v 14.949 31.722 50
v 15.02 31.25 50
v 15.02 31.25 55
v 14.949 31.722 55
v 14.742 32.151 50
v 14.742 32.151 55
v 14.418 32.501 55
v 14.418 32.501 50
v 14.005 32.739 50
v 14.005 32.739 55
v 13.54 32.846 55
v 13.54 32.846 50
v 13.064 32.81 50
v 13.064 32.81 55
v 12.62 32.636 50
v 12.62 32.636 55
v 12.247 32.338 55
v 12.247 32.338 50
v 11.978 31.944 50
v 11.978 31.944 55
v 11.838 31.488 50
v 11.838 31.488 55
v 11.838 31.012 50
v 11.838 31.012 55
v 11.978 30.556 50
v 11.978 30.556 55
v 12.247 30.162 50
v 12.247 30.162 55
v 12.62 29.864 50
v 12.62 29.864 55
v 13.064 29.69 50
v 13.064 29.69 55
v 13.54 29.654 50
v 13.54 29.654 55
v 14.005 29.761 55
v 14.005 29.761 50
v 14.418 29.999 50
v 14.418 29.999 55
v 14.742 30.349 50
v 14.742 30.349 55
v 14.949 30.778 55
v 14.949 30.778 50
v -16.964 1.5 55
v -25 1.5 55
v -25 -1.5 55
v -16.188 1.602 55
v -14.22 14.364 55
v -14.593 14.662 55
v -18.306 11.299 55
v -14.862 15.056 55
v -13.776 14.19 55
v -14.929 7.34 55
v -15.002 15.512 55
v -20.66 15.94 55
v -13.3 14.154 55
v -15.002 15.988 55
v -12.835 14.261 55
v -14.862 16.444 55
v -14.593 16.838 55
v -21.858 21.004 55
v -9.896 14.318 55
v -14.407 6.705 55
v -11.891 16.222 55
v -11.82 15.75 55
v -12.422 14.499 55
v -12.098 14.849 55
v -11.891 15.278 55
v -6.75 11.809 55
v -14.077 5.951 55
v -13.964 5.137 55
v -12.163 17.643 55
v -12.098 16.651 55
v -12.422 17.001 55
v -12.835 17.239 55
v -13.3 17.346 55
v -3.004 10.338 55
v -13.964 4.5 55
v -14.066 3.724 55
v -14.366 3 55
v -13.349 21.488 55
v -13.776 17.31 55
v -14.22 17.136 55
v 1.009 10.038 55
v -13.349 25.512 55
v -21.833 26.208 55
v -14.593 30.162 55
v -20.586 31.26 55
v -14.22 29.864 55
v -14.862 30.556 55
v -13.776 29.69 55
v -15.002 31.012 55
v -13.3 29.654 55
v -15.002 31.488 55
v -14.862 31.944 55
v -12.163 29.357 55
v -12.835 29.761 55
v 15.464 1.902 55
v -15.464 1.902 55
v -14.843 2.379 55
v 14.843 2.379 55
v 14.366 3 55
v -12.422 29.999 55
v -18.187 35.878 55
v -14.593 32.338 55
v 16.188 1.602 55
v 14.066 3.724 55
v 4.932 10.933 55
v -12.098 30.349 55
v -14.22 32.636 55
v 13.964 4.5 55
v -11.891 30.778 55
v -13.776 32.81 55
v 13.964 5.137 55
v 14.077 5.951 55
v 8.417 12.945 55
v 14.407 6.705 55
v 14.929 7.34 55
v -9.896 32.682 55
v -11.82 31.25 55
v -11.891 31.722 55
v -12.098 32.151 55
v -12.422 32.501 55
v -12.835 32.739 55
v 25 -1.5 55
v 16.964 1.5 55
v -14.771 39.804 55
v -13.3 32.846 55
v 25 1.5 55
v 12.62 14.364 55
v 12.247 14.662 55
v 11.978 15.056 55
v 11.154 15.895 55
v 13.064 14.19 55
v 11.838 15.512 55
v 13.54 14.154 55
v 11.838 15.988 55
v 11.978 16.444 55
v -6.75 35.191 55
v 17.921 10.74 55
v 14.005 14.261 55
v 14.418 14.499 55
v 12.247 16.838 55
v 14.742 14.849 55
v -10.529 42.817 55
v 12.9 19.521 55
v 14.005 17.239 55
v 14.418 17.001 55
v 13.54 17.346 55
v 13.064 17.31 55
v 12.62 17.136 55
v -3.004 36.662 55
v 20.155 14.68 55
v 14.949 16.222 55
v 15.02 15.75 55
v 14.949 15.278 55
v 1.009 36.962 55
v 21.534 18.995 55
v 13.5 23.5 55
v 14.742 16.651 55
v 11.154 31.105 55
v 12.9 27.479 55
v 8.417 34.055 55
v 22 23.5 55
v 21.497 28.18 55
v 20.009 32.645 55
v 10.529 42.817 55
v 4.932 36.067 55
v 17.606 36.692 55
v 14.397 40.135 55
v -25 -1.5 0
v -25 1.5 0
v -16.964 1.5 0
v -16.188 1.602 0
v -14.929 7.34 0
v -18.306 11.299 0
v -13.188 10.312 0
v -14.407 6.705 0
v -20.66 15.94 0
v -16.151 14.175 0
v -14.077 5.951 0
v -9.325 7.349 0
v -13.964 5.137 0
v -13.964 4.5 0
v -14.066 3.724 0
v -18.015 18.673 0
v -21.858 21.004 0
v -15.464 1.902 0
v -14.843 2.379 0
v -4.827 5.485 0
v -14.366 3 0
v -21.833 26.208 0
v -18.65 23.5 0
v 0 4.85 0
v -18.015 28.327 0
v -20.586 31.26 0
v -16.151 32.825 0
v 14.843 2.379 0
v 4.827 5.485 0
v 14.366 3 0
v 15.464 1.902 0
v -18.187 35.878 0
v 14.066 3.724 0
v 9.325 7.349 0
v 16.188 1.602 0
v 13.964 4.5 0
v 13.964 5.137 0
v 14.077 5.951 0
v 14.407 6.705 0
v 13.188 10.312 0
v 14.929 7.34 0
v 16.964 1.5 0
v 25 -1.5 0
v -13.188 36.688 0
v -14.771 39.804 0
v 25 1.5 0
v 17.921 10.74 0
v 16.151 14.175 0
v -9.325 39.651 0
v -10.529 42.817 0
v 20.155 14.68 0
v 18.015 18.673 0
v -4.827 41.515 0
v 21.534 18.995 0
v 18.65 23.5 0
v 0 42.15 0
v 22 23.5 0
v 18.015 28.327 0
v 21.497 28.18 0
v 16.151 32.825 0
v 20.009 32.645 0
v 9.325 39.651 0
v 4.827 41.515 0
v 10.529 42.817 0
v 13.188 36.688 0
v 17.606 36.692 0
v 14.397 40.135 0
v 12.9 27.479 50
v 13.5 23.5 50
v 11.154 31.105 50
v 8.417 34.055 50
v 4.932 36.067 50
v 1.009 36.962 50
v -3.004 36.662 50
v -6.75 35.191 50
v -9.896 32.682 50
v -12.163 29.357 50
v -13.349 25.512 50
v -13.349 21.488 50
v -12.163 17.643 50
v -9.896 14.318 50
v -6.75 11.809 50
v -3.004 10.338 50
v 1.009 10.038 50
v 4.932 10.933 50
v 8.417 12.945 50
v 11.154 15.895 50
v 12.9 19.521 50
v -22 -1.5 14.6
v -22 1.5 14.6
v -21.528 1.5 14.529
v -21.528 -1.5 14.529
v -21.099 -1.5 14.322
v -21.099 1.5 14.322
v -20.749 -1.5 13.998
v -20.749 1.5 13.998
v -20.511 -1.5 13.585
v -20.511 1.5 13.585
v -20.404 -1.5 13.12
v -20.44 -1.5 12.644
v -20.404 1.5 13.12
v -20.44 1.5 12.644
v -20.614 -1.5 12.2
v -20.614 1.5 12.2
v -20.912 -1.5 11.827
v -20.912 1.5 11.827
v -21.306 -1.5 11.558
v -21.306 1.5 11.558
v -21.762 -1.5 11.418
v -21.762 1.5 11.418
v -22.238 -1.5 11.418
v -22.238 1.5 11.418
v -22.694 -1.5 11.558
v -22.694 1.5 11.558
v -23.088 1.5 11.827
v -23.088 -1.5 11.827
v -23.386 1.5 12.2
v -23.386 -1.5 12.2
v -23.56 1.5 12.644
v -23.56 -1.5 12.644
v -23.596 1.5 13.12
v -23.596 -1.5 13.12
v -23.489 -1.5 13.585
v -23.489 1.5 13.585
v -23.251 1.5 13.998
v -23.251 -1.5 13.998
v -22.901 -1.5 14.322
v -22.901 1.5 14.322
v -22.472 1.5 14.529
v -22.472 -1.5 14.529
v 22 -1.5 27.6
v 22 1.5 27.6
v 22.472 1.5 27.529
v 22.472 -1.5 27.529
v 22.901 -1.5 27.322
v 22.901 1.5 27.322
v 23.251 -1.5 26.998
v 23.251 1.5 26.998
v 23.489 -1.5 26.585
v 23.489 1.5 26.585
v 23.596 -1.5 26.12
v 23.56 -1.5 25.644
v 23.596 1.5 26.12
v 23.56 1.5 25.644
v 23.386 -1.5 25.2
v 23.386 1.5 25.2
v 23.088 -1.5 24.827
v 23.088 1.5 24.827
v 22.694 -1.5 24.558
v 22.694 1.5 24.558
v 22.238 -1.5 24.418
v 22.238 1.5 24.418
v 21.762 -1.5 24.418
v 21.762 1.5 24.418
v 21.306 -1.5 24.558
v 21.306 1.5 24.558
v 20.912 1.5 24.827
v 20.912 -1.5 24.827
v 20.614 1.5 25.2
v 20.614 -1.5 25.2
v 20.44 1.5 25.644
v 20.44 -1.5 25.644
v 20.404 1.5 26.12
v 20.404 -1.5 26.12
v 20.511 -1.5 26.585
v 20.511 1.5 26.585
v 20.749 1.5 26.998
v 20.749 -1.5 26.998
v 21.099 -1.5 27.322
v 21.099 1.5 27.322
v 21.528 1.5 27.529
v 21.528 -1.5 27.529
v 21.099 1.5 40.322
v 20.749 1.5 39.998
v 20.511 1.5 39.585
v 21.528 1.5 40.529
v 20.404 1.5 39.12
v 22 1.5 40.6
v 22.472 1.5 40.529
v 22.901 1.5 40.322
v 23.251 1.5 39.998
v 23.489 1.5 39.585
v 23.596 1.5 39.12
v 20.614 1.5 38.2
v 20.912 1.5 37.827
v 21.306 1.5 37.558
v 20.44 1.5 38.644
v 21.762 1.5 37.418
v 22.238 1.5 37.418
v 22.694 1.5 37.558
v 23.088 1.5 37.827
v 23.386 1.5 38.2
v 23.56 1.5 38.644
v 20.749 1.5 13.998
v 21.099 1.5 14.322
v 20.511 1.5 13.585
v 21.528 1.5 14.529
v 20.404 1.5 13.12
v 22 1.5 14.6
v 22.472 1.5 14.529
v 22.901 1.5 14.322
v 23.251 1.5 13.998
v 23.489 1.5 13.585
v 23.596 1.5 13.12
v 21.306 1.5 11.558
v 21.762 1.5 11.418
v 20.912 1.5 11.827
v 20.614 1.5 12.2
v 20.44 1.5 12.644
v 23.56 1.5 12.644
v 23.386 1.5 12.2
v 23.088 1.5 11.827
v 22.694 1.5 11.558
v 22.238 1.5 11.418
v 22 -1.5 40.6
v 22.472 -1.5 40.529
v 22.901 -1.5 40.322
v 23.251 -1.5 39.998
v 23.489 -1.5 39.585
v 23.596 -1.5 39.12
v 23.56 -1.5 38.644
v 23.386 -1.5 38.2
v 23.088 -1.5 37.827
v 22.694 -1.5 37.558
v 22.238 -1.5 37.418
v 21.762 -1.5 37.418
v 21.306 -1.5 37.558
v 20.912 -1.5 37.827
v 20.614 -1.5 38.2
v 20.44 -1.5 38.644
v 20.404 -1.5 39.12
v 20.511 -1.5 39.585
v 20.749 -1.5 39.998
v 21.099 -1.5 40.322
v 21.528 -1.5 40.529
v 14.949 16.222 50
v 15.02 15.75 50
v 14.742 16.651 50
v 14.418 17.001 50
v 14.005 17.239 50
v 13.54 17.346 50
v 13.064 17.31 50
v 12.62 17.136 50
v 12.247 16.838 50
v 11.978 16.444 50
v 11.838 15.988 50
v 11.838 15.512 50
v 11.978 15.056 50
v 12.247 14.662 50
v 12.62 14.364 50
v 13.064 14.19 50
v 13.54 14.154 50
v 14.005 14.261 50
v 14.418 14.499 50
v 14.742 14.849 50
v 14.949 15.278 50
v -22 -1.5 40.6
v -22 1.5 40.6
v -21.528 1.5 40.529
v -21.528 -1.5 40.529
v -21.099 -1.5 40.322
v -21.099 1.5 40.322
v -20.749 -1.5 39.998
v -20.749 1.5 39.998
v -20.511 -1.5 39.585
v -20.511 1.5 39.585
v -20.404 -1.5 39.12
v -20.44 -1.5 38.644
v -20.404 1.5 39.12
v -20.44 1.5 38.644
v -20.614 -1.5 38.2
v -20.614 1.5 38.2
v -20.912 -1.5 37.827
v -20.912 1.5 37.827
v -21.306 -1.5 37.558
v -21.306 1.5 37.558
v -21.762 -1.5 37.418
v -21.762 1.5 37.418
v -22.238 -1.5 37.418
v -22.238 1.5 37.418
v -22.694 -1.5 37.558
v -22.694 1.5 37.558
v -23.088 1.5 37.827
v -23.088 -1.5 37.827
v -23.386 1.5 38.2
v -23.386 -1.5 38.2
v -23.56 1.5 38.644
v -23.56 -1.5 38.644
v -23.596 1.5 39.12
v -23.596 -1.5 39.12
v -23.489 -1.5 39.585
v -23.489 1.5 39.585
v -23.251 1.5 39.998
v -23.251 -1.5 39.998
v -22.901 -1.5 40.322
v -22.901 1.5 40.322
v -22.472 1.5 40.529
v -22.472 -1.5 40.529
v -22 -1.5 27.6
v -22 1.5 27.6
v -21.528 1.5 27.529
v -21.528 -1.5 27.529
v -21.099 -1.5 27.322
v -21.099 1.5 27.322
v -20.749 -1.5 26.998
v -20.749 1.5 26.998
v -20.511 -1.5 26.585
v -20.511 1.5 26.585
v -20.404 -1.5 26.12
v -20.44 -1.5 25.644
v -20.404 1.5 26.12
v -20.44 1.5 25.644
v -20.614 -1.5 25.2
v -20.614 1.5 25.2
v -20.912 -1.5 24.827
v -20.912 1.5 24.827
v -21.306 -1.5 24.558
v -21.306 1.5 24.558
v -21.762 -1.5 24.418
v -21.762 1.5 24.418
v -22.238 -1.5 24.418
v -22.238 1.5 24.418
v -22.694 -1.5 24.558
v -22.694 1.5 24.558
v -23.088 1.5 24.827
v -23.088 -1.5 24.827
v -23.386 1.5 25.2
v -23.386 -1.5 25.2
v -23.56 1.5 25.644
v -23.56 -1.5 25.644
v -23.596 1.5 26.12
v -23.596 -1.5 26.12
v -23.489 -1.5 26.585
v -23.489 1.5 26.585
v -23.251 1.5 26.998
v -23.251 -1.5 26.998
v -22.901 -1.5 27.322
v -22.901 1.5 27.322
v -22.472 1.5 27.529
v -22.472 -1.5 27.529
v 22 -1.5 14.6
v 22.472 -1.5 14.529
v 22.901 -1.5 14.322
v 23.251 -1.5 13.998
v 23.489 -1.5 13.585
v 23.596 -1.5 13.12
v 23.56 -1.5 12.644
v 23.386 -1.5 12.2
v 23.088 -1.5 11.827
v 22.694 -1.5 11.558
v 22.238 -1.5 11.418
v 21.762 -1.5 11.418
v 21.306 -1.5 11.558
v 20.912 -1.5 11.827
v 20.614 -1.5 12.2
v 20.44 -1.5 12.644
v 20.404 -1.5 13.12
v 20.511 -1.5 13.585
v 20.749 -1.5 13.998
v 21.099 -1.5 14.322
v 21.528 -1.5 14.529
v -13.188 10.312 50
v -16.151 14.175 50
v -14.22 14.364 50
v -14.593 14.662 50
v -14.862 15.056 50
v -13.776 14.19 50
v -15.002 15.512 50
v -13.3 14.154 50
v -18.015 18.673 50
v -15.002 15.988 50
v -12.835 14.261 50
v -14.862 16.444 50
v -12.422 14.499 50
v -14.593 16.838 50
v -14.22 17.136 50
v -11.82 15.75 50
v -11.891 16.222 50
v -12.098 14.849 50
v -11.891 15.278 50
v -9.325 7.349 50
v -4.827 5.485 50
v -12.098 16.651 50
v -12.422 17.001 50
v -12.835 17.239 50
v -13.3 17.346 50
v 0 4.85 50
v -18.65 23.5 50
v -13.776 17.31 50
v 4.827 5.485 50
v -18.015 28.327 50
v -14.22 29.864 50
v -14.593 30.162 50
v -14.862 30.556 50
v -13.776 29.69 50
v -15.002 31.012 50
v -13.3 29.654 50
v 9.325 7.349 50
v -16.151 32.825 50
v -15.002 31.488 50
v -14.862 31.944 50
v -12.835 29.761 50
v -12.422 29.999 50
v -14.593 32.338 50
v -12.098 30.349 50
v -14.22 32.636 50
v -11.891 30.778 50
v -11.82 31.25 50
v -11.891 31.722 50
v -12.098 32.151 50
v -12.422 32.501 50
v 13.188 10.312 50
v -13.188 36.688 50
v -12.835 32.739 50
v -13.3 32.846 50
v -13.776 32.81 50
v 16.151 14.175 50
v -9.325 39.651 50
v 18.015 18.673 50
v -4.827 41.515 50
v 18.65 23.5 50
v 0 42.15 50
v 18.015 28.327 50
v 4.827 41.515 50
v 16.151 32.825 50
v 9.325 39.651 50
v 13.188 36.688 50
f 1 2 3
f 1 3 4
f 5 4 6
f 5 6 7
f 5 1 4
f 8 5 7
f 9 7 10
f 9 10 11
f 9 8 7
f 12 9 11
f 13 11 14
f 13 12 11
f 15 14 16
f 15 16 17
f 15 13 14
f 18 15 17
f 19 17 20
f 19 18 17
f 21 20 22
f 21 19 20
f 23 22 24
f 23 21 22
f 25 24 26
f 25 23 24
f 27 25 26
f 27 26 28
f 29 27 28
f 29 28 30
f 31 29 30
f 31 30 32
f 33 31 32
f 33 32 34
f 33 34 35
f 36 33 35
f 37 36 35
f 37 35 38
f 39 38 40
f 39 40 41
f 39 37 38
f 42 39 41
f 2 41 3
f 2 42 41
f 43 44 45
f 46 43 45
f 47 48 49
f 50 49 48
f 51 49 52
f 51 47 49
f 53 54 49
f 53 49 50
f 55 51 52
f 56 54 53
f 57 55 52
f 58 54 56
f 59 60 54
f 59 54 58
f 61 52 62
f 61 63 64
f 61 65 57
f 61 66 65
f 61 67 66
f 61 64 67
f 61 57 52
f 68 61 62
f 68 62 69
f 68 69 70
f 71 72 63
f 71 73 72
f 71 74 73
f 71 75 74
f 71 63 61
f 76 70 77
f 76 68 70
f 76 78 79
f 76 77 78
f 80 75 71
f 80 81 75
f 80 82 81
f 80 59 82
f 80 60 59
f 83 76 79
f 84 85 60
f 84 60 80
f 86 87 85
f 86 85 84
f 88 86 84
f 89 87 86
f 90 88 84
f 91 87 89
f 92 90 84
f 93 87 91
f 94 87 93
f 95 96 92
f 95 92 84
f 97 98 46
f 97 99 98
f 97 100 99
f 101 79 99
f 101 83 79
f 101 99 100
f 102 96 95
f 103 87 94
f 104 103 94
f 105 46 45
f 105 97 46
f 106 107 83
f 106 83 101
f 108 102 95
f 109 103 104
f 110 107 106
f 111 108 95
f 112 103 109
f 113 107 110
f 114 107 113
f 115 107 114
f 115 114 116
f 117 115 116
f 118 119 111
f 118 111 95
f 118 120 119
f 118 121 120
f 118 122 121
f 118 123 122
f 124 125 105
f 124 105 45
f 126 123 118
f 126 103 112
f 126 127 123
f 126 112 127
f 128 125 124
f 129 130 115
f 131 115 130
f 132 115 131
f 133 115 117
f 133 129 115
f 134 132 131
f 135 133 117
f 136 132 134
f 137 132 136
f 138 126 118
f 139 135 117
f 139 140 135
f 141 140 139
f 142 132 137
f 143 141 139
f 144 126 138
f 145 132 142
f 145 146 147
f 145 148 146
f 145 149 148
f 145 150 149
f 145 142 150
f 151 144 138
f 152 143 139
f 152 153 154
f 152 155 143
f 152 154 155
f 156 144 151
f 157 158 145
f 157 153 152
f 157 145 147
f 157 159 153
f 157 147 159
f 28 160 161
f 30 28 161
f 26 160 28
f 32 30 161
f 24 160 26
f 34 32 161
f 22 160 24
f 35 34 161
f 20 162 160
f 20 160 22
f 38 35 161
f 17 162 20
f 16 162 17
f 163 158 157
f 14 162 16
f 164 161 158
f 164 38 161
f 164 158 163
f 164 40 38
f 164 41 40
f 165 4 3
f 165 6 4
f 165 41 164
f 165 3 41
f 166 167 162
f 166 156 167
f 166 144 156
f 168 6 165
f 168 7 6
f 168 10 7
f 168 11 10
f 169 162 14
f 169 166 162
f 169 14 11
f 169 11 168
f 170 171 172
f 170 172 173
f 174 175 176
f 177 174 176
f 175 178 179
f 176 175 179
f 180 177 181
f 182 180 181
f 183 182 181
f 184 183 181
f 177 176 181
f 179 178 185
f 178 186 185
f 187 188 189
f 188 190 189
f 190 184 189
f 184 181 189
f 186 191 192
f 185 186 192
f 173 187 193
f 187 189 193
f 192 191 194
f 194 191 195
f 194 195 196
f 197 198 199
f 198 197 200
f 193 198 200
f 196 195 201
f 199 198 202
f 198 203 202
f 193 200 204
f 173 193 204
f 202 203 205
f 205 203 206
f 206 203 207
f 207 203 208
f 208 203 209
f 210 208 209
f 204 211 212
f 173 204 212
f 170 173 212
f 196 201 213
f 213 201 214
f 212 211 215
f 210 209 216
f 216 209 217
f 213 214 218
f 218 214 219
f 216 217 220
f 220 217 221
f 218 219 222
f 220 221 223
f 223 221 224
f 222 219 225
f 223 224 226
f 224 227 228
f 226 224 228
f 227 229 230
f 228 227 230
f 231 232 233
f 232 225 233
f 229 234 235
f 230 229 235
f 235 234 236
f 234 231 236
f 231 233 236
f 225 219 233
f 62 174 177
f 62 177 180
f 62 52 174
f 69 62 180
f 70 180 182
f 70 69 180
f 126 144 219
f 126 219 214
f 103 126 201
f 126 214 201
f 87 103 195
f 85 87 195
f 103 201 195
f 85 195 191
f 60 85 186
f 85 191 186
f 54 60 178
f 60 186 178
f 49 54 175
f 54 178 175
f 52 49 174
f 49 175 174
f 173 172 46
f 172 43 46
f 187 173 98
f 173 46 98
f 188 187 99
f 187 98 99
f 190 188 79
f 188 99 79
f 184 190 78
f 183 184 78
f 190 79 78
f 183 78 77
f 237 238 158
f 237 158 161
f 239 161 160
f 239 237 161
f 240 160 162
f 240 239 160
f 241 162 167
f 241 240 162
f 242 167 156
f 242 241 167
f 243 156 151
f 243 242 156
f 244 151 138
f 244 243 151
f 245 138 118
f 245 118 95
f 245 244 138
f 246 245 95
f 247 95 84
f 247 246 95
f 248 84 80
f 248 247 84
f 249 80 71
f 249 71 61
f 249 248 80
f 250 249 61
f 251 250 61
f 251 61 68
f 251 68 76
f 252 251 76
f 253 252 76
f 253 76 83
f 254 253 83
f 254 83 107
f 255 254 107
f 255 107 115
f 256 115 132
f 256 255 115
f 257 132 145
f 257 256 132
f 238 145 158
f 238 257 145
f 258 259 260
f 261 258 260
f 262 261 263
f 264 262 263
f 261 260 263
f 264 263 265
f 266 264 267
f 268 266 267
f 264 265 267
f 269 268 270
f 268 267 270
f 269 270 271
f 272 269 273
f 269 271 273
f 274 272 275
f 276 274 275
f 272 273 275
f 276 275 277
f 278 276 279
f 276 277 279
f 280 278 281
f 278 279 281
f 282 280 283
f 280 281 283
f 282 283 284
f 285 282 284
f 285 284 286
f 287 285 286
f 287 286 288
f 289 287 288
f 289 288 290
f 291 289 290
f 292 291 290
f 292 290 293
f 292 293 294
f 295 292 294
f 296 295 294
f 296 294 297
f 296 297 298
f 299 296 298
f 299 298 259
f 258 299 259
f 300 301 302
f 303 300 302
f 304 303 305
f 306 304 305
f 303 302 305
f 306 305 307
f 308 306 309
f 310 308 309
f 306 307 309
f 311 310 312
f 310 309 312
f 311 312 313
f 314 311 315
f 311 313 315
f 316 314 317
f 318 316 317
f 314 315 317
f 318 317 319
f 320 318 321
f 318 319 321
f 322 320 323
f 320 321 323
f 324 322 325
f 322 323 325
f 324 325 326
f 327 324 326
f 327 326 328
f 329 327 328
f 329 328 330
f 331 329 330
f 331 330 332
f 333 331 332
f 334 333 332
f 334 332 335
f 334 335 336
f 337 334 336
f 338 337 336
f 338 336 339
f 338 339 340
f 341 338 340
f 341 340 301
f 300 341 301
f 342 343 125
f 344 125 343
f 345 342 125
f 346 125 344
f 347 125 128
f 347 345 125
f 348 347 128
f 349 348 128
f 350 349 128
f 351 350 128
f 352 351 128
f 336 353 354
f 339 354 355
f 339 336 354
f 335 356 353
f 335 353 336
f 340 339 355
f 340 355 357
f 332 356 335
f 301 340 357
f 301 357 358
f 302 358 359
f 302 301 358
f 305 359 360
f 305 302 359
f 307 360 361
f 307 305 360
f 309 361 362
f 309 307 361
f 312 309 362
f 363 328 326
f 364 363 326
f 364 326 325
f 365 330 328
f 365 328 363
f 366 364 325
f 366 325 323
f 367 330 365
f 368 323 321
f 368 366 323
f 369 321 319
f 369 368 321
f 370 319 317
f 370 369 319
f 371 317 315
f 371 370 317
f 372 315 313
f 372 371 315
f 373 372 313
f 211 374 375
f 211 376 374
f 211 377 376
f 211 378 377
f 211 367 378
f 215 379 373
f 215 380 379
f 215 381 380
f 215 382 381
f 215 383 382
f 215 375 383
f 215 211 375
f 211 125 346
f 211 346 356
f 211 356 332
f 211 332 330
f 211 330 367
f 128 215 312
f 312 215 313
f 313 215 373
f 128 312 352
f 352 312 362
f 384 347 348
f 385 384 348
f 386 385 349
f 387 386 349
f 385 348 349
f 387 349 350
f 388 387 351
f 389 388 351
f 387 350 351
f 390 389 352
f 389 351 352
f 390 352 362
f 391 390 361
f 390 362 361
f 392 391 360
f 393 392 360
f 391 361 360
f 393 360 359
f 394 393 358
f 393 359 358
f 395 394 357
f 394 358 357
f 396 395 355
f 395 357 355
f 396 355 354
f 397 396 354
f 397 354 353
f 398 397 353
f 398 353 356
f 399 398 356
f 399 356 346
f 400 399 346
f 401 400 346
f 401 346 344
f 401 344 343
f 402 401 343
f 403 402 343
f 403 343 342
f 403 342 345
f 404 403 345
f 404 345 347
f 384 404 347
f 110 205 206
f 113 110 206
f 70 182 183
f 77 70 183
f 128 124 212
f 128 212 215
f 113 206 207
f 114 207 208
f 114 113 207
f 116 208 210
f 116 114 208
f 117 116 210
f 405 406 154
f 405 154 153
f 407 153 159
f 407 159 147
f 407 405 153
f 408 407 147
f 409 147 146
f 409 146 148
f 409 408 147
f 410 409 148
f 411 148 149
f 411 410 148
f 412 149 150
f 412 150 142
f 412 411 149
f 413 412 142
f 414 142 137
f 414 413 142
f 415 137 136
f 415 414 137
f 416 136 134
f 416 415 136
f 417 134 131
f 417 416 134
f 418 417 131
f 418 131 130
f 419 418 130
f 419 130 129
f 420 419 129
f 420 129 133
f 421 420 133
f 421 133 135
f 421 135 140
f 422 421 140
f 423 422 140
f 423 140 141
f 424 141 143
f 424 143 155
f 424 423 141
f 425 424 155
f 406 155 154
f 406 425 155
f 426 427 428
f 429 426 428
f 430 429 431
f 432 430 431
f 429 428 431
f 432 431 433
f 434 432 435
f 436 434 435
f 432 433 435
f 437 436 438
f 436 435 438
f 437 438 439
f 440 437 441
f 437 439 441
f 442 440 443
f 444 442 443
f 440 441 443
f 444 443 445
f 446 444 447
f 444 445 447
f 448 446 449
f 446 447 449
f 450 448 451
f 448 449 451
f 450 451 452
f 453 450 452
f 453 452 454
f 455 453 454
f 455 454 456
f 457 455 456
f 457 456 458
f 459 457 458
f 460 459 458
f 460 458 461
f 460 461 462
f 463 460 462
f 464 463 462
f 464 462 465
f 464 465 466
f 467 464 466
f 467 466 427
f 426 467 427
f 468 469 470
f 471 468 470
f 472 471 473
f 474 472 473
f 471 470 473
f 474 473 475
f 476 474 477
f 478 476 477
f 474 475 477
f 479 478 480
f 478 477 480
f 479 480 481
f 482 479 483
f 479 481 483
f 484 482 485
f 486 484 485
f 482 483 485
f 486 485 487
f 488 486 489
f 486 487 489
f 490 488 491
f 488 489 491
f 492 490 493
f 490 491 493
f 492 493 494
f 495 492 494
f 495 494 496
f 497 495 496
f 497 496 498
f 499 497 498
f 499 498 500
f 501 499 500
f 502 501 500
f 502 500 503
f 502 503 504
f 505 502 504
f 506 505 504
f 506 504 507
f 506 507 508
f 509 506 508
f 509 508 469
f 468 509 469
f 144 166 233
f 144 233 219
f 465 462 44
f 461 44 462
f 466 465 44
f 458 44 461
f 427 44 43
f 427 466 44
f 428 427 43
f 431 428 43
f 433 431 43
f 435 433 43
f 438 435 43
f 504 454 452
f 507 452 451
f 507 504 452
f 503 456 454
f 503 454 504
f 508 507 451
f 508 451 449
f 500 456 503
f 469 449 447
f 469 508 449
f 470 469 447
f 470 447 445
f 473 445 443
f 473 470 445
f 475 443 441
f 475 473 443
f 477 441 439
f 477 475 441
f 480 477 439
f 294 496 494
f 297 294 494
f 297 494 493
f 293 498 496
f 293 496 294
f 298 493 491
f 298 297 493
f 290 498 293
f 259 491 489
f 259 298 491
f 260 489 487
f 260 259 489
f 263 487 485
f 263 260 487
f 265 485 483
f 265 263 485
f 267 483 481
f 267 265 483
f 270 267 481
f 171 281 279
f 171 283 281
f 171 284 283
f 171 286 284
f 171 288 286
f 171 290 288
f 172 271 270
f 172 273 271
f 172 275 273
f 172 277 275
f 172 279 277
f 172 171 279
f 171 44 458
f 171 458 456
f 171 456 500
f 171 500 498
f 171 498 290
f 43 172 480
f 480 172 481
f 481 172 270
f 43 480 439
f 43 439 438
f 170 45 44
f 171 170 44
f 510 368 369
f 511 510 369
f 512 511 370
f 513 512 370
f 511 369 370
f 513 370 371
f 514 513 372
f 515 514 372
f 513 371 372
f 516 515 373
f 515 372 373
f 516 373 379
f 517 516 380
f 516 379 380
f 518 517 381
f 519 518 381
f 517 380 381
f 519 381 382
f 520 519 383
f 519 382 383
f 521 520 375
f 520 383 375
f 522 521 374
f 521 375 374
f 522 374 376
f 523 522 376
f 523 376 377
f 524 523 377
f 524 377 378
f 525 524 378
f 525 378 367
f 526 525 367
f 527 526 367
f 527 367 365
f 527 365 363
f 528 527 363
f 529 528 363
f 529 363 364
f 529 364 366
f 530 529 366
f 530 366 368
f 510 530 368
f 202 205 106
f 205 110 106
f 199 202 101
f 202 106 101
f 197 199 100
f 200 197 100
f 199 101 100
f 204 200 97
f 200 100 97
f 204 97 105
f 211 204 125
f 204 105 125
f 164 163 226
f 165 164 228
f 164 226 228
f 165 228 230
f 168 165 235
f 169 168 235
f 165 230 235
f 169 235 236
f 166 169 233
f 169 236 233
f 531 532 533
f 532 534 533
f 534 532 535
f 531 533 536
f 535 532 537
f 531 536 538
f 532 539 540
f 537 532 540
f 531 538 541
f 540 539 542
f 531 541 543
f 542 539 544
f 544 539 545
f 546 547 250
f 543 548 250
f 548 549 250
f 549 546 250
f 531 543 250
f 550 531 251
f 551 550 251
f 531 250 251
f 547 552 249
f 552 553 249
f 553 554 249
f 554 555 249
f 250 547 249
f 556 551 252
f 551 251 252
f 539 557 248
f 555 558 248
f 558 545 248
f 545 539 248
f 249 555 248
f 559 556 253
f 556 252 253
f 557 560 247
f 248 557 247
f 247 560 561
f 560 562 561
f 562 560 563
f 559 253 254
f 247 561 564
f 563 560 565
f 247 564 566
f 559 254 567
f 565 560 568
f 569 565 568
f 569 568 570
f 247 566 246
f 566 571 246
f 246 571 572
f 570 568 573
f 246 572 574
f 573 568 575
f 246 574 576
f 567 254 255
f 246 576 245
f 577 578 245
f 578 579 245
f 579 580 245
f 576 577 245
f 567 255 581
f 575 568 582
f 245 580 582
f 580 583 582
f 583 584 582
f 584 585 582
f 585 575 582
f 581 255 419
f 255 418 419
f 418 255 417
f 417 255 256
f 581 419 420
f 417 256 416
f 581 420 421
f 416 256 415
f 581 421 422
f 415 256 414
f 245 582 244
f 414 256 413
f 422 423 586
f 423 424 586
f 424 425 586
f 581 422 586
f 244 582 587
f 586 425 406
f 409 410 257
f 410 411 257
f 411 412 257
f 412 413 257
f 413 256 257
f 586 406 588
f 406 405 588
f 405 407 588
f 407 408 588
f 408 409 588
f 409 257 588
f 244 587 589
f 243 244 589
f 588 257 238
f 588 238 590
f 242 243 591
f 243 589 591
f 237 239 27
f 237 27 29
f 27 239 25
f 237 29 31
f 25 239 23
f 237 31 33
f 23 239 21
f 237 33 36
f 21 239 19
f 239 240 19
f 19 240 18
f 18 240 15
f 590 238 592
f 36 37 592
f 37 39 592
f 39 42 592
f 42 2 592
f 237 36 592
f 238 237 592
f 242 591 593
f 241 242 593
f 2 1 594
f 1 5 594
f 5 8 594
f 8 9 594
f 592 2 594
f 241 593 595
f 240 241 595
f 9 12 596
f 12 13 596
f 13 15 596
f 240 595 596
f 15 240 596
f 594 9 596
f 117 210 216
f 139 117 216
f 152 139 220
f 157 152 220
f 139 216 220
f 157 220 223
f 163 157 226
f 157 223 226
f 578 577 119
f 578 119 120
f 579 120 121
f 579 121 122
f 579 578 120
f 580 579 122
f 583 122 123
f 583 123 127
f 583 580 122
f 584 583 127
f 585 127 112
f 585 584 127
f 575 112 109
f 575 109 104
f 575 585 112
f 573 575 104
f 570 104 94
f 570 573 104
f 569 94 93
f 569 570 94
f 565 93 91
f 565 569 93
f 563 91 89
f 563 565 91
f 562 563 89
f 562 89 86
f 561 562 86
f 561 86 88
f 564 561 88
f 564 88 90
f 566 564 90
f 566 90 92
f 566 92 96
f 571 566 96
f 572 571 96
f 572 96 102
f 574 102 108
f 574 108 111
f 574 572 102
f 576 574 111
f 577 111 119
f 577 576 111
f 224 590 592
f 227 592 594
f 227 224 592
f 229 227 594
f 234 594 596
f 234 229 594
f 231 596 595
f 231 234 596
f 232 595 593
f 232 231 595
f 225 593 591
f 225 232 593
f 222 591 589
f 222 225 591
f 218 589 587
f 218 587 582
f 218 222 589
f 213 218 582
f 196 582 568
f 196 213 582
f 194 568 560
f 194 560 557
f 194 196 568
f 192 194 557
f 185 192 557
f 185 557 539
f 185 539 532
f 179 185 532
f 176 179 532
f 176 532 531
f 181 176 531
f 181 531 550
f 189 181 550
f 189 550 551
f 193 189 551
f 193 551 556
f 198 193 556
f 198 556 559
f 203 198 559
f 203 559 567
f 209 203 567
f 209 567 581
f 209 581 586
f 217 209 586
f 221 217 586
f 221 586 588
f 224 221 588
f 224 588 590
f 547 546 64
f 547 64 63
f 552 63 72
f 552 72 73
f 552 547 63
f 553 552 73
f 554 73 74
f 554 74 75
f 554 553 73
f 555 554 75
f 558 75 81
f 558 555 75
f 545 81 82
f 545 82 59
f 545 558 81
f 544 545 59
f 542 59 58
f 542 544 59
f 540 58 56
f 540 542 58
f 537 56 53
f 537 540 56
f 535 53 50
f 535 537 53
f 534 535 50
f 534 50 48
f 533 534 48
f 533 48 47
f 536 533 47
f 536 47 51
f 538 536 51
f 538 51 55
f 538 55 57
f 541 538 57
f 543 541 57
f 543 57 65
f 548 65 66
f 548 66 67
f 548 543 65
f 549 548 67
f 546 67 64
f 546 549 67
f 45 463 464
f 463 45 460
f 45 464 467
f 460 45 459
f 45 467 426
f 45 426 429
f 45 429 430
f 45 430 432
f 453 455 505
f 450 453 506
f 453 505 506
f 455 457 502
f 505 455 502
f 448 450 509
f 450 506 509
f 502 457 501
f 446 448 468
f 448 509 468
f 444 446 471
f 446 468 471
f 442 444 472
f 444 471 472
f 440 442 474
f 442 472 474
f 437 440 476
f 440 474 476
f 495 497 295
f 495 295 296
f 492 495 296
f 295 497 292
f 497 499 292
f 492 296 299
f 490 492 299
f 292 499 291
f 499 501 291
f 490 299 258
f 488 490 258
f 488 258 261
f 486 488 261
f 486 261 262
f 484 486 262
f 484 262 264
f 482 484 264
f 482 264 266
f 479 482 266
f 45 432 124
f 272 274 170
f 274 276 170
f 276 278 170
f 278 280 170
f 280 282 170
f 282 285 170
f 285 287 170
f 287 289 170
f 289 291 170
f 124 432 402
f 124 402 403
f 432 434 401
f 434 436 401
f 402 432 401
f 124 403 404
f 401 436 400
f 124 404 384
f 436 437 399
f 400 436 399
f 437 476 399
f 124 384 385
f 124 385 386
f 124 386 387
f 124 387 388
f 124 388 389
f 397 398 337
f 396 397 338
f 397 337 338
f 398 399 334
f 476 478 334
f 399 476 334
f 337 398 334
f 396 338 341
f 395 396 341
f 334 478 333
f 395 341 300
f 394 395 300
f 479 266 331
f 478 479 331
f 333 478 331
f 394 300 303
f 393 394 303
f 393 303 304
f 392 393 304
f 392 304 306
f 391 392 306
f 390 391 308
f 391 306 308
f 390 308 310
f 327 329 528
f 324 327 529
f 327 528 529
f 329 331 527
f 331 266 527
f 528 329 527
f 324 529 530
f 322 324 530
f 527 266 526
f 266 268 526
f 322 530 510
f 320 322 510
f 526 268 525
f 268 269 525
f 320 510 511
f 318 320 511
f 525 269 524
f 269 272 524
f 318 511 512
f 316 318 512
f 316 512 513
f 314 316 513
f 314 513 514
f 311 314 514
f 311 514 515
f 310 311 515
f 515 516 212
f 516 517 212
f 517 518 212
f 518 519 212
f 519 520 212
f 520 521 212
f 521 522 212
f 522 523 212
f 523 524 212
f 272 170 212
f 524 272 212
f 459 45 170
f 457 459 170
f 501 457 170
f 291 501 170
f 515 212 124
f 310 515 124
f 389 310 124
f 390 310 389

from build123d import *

# Parameters (mm, degrees)
IZIM1_R                     = 18.65
IZIM1_W                     = 50
IZIM1_H                     = 3
Y_KSEKLIK_EKSTR_ZYON4_DEPTH = 55
RADYUS1_R                   = 3
RADYUS2_R                   = 3
IZIM7_R                     = 1.6
KES_EKSTR_ZYON1_DEPTH       = 55
IZIM8_R                     = 1.6
KES_EKSTR_ZYON2_DEPTH       = 55
Y_KSEKLIK_EKSTR_ZYON5_START = -5
IZIM10_R                    = 18.65
IZIM10_R_2                  = 13.5
IZIM10_R_3                  = 1.6
Y_KSEKLIK_EKSTR_ZYON5_DEPTH = 5


with BuildPart() as part:
    # Çizim1 → Yükseklik-Ekstrüzyon4 (new body)
    # profile 1 of 4: a face of its own
    with BuildSketch(Plane.XY):
        with BuildLine():
            ThreePointArc((-10.528747961, 42.81697353), (-21.902220366, 25.57189359), (-13.964240044, 6.5))
            ThreePointArc((-13.964240044, 6.5), (-7.416198487, 2.787684823), (0, 1.5))
            ThreePointArc((0, 1.5), (7.416198487, 2.787684823), (13.964240044, 6.5))
            ThreePointArc((13.964240044, 6.5), (19.889862757, 14.098225725), (22, 23.5))
            ThreePointArc((22, 23.5), (18.916030968, 34.733155052), (10.528747961, 42.81697353))
            Line((10.528747961, 42.81697353), (-10.528747961, 42.81697353))
        make_face()
        with Locations((0, 23.5)):
            Circle(IZIM1_R, mode=Mode.SUBTRACT)
    # profile 2 of 4: a face of its own
    with BuildSketch(Plane.XY):
        Rectangle(IZIM1_W, IZIM1_H)
    # profile 3 of 4: a face of its own
    with BuildSketch(Plane.XY):
        with BuildLine():
            ThreePointArc((0, 1.5), (-7.416198487, 2.787684823), (-13.964240044, 6.5))
            Line((-13.964240044, 6.5), (-13.964240044, 1.5))
            Line((-13.964240044, 1.5), (0, 1.5))
        make_face()
    # profile 4 of 4: a face of its own
    with BuildSketch(Plane.XY):
        with BuildLine():
            ThreePointArc((13.964240044, 6.5), (7.416198487, 2.787684823), (0, 1.5))
            Line((0, 1.5), (13.964240044, 1.5))
            Line((13.964240044, 1.5), (13.964240044, 6.5))
        make_face()
    extrude(amount=Y_KSEKLIK_EKSTR_ZYON4_DEPTH)

    # Radyus1
    radyus1_edges = [part.edges().sort_by_distance(p)[0] for p in [
        (13.964240044, 6.5, 27.5),
        (13.964240044, 1.5, 27.5),
    ]]
    fillet(radyus1_edges, radius=RADYUS1_R)

    # Radyus2
    radyus2_edges = [part.edges().sort_by_distance(p)[0] for p in [
        (-13.964240044, 1.5, 27.5),
        (-13.964240044, 6.5, 27.5),
    ]]
    fillet(radyus2_edges, radius=RADYUS2_R)

    # Çizim7 → Kes-Ekstrüzyon1 (cut)
    with BuildSketch(Plane(origin=(0, 1.5, 0), x_dir=(1, 0, 0), z_dir=(0, 1, 0))):
        with Locations(Location((-22, -13, 0), (0, 0, 270))):
            Circle(IZIM7_R)
        with Locations(Location((-22, -26, 0), (0, 0, 270))):
            Circle(IZIM7_R)
        with Locations(Location((-22, -39, 0), (0, 0, 270))):
            Circle(IZIM7_R)
    extrude(amount=-KES_EKSTR_ZYON1_DEPTH, mode=Mode.SUBTRACT)

    # Çizim8 → Kes-Ekstrüzyon2 (cut)
    with BuildSketch(Plane(origin=(0, 1.5, 0), x_dir=(1, 0, 0), z_dir=(0, 1, 0))):
        with Locations(Location((22, -13, 0), (0, 0, 270))):
            Circle(IZIM8_R)
        with Locations(Location((22, -26, 0), (0, 0, 270))):
            Circle(IZIM8_R)
        with Locations(Location((22, -39, 0), (0, 0, 270))):
            Circle(IZIM8_R)
    extrude(amount=-KES_EKSTR_ZYON2_DEPTH, mode=Mode.SUBTRACT)

    # Çizim10 → Yükseklik-Ekstrüzyon5 (add)
    with BuildSketch(Plane.XY.offset(55).offset(Y_KSEKLIK_EKSTR_ZYON5_START)):
        with Locations((0, 23.5)):
            Circle(IZIM10_R)
        with Locations((0, 23.5)):
            Circle(IZIM10_R_2, mode=Mode.SUBTRACT)
        with Locations((-13.42, 31.25)):
            Circle(IZIM10_R_3, mode=Mode.SUBTRACT)
        with Locations((-13.42, 15.75)):
            Circle(IZIM10_R_3, mode=Mode.SUBTRACT)
        with Locations((13.42, 31.25)):
            Circle(IZIM10_R_3, mode=Mode.SUBTRACT)
        with Locations((13.42, 15.75)):
            Circle(IZIM10_R_3, mode=Mode.SUBTRACT)
    extrude(amount=Y_KSEKLIK_EKSTR_ZYON5_DEPTH)


solid = part.part
